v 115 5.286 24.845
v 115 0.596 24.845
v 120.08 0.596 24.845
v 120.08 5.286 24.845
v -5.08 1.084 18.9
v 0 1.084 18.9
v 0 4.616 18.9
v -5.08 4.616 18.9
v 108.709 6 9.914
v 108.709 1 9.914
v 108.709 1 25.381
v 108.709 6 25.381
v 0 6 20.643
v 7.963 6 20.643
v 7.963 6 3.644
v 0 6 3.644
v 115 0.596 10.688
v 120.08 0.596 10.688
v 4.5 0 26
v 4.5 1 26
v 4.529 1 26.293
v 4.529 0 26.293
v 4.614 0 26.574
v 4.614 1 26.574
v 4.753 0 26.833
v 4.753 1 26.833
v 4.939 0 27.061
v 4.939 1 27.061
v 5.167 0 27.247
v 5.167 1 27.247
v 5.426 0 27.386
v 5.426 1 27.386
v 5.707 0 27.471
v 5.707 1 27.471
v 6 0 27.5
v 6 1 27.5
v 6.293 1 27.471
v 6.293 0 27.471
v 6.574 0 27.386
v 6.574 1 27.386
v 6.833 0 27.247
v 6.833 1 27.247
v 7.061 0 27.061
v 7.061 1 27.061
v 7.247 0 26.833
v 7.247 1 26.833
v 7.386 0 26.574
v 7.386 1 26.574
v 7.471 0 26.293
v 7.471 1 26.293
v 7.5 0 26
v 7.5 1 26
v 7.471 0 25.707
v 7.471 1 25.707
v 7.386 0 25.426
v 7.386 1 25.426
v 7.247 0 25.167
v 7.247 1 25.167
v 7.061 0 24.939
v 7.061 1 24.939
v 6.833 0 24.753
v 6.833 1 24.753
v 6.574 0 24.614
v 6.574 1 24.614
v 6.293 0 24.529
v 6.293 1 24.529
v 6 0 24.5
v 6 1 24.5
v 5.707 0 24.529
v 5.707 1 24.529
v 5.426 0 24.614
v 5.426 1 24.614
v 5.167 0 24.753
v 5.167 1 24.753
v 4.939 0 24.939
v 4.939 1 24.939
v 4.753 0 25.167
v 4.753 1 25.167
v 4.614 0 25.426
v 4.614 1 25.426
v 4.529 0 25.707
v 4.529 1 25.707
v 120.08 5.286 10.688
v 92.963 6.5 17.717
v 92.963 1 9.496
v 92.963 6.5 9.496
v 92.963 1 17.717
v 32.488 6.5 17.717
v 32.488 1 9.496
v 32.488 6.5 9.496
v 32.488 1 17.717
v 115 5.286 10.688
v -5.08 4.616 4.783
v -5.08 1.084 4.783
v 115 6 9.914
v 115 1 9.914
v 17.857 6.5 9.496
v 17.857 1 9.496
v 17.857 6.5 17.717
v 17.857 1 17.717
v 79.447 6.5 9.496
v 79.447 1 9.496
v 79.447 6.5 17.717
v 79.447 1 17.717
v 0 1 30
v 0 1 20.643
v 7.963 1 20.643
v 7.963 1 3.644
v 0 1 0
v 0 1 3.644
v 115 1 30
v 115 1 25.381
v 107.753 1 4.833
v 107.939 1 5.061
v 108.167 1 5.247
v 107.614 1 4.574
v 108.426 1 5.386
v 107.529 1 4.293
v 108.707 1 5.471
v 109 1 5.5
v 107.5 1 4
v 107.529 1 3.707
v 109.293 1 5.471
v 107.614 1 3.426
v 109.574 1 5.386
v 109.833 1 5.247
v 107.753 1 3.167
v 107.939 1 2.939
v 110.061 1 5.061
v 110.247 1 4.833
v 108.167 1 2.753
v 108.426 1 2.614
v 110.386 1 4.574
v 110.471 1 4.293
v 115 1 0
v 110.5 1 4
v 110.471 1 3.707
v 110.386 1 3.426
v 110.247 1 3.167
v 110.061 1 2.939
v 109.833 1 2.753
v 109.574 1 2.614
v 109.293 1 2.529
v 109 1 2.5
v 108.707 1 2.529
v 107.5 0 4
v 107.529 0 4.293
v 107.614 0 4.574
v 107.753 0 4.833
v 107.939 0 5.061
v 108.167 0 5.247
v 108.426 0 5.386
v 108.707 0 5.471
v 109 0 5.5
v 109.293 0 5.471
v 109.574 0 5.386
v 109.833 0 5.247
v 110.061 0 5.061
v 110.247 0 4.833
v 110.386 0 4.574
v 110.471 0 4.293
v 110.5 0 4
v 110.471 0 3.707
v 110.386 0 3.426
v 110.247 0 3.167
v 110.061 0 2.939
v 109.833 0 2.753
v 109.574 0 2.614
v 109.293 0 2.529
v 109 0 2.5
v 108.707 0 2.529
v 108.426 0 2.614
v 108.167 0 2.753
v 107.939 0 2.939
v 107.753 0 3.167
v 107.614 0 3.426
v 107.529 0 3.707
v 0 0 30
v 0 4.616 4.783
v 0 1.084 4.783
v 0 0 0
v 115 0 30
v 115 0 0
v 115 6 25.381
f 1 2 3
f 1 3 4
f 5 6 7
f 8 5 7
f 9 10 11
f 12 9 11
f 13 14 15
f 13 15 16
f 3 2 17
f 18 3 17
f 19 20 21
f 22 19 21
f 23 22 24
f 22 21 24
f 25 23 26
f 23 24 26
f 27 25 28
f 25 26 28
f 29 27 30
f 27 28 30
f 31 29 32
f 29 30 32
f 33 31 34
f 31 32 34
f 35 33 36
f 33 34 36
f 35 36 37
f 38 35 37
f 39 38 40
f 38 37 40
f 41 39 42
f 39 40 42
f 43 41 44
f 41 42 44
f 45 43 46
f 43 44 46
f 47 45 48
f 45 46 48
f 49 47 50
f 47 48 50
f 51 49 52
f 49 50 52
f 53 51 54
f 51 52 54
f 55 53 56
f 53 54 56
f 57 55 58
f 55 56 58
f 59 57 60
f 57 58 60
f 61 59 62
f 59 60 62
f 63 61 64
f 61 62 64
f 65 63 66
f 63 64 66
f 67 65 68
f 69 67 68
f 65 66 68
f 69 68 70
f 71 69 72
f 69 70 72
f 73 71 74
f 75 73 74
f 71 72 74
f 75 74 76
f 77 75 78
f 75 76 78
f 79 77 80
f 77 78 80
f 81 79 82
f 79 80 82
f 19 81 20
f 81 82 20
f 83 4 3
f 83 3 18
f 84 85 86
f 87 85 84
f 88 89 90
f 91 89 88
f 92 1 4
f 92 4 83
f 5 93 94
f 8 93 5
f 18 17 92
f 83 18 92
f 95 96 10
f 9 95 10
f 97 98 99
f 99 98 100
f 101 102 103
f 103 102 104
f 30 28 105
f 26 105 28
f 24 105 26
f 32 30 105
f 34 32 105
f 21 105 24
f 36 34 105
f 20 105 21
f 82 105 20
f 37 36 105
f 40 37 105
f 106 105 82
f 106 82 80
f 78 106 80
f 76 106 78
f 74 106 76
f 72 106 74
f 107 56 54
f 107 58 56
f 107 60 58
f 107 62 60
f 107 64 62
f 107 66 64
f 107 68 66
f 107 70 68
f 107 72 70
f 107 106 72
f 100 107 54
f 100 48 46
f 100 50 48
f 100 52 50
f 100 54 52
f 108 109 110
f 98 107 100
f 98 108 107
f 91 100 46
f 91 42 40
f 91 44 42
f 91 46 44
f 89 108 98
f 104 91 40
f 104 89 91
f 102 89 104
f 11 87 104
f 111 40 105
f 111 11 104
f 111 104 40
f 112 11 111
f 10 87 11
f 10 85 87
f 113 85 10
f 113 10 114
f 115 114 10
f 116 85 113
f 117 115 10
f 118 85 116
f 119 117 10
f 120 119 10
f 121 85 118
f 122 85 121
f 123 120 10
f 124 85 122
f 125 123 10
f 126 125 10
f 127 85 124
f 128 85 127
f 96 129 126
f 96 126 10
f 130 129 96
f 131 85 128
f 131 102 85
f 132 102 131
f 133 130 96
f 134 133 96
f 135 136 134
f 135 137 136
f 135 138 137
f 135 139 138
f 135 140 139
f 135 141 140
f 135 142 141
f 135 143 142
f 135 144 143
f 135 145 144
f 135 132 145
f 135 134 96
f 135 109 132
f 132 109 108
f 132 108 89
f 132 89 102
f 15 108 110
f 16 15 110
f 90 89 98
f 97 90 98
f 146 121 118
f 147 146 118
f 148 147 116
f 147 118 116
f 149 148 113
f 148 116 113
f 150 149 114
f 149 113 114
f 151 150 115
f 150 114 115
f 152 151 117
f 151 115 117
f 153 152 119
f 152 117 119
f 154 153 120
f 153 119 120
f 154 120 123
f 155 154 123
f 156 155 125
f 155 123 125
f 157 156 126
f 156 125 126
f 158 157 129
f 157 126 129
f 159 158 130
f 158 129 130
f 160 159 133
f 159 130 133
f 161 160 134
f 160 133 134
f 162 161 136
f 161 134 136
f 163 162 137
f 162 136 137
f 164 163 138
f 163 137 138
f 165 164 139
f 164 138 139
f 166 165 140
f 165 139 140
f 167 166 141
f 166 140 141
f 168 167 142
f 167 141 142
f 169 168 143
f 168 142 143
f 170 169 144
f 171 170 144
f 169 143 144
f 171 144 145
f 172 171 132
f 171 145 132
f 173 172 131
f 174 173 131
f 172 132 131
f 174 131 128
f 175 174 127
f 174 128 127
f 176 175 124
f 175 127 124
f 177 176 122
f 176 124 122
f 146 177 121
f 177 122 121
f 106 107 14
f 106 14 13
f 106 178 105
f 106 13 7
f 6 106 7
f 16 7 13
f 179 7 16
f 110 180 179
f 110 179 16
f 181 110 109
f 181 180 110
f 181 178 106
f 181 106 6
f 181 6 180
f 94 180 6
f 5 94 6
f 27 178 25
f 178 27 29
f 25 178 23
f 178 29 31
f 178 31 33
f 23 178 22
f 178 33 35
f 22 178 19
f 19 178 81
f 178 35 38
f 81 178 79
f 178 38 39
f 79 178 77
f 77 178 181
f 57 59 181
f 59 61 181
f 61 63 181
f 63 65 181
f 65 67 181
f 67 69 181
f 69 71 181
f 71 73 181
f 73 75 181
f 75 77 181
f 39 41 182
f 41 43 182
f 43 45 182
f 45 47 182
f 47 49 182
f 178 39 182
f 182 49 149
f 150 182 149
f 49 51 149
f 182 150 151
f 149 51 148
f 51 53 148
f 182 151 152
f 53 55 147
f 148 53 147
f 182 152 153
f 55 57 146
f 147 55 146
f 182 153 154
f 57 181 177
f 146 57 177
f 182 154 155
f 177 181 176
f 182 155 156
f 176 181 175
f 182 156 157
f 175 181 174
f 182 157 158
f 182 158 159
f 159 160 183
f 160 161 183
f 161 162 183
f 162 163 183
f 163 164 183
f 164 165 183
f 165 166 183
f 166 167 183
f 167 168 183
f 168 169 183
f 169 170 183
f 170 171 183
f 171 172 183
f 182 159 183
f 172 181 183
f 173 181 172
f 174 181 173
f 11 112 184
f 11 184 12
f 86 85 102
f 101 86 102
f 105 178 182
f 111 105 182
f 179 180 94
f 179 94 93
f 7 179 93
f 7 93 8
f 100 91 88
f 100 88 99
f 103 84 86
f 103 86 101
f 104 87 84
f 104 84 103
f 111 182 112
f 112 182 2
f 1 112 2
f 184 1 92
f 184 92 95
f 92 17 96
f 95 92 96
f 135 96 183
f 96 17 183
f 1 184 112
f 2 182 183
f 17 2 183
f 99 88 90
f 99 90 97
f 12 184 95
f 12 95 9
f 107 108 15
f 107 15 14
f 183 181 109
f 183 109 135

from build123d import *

# Parameters (mm, degrees)
SKETCH1_W                       = 115
SKETCH1_H                       = 30
EXTRUDE1_DEPTH                  = 1
SKETCH2_R                       = 1.5
MOUNT_HOLES_CUT_DEPTH           = 1
SKETCH4_W                       = 13.516297105
SKETCH4_H                       = 8.221252878
SKETCH4_W_2                     = 14.631043257
INDUCTORS_DEPTH                 = 5.5
SKETCH5_W                       = 6.291348601
SKETCH5_H                       = 15.467102872
SKETCH5_W_2                     = 7.96346783
SKETCH5_H_2                     = 16.999878832
CCFL_CONN_DEPTH                 = 5
SKETCH6_W                       = 14.156835531
SKETCH6_H                       = 4.690856218
MATE_AND_WIRE_STICK_OUT_1_DEPTH = 5.08
SKETCH7_W                       = 14.117118553
SKETCH7_H                       = 3.532074628
MATE_AND_WIRE_STICK_OUT_2_DEPTH = 5.08


with BuildPart() as part:
    # Sketch1 → Extrude1 (new body)
    with BuildSketch(Plane(origin=(0, 0, 0), x_dir=(1, 0, 0), z_dir=(0, 1, 0))):
        with Locations((57.5, -15)):
            Rectangle(SKETCH1_W, SKETCH1_H)
    extrude(amount=EXTRUDE1_DEPTH)

    # Sketch2 → mount holes - cut (cut)
    with BuildSketch(Plane(origin=(0, 1, 0), x_dir=(-1, 0, 0), z_dir=(0, 1, 0))):
        with Locations((-109, 4)):
            Circle(SKETCH2_R)
        with Locations((-6, 26)):
            Circle(SKETCH2_R)
    extrude(amount=-MOUNT_HOLES_CUT_DEPTH, mode=Mode.SUBTRACT)

    # Sketch4 → inductors (add)
    with BuildSketch(Plane(origin=(0, 1, 0), x_dir=(-1, 0, 0), z_dir=(0, 1, 0))):
        with Locations((-86.204713438, 13.606567309)):
            Rectangle(SKETCH4_W, SKETCH4_H)
        with Locations((-25.172361566, 13.606567309)):
            Rectangle(SKETCH4_W_2, SKETCH4_H)
    extrude(amount=INDUCTORS_DEPTH)

    # Sketch5 → ccfl conn (add)
    with BuildSketch(Plane(origin=(0, 1, 0), x_dir=(-1, 0, 0), z_dir=(0, 1, 0))):
        with Locations((-111.8543257, 17.647522113)):
            Rectangle(SKETCH5_W, SKETCH5_H)
        with Locations((-3.981733915, 12.143462983)):
            Rectangle(SKETCH5_W_2, SKETCH5_H_2)
    extrude(amount=CCFL_CONN_DEPTH)

    # Sketch6 → mate and wire stick-out 1 (add)
    with BuildSketch(Plane(origin=(115, 0, 0), x_dir=(0, 0, -1), z_dir=(1, 0, 0))):
        with Locations((-17.7667625, 2.941021447)):
            Rectangle(SKETCH6_W, SKETCH6_H)
    extrude(amount=MATE_AND_WIRE_STICK_OUT_1_DEPTH)

    # Sketch7 → mate and wire stick-out 2 (add)
    with BuildSketch(Plane.ZY):
        with Locations((11.841645931, 2.849567483)):
            Rectangle(SKETCH7_W, SKETCH7_H)
    extrude(amount=MATE_AND_WIRE_STICK_OUT_2_DEPTH)


solid = part.part
